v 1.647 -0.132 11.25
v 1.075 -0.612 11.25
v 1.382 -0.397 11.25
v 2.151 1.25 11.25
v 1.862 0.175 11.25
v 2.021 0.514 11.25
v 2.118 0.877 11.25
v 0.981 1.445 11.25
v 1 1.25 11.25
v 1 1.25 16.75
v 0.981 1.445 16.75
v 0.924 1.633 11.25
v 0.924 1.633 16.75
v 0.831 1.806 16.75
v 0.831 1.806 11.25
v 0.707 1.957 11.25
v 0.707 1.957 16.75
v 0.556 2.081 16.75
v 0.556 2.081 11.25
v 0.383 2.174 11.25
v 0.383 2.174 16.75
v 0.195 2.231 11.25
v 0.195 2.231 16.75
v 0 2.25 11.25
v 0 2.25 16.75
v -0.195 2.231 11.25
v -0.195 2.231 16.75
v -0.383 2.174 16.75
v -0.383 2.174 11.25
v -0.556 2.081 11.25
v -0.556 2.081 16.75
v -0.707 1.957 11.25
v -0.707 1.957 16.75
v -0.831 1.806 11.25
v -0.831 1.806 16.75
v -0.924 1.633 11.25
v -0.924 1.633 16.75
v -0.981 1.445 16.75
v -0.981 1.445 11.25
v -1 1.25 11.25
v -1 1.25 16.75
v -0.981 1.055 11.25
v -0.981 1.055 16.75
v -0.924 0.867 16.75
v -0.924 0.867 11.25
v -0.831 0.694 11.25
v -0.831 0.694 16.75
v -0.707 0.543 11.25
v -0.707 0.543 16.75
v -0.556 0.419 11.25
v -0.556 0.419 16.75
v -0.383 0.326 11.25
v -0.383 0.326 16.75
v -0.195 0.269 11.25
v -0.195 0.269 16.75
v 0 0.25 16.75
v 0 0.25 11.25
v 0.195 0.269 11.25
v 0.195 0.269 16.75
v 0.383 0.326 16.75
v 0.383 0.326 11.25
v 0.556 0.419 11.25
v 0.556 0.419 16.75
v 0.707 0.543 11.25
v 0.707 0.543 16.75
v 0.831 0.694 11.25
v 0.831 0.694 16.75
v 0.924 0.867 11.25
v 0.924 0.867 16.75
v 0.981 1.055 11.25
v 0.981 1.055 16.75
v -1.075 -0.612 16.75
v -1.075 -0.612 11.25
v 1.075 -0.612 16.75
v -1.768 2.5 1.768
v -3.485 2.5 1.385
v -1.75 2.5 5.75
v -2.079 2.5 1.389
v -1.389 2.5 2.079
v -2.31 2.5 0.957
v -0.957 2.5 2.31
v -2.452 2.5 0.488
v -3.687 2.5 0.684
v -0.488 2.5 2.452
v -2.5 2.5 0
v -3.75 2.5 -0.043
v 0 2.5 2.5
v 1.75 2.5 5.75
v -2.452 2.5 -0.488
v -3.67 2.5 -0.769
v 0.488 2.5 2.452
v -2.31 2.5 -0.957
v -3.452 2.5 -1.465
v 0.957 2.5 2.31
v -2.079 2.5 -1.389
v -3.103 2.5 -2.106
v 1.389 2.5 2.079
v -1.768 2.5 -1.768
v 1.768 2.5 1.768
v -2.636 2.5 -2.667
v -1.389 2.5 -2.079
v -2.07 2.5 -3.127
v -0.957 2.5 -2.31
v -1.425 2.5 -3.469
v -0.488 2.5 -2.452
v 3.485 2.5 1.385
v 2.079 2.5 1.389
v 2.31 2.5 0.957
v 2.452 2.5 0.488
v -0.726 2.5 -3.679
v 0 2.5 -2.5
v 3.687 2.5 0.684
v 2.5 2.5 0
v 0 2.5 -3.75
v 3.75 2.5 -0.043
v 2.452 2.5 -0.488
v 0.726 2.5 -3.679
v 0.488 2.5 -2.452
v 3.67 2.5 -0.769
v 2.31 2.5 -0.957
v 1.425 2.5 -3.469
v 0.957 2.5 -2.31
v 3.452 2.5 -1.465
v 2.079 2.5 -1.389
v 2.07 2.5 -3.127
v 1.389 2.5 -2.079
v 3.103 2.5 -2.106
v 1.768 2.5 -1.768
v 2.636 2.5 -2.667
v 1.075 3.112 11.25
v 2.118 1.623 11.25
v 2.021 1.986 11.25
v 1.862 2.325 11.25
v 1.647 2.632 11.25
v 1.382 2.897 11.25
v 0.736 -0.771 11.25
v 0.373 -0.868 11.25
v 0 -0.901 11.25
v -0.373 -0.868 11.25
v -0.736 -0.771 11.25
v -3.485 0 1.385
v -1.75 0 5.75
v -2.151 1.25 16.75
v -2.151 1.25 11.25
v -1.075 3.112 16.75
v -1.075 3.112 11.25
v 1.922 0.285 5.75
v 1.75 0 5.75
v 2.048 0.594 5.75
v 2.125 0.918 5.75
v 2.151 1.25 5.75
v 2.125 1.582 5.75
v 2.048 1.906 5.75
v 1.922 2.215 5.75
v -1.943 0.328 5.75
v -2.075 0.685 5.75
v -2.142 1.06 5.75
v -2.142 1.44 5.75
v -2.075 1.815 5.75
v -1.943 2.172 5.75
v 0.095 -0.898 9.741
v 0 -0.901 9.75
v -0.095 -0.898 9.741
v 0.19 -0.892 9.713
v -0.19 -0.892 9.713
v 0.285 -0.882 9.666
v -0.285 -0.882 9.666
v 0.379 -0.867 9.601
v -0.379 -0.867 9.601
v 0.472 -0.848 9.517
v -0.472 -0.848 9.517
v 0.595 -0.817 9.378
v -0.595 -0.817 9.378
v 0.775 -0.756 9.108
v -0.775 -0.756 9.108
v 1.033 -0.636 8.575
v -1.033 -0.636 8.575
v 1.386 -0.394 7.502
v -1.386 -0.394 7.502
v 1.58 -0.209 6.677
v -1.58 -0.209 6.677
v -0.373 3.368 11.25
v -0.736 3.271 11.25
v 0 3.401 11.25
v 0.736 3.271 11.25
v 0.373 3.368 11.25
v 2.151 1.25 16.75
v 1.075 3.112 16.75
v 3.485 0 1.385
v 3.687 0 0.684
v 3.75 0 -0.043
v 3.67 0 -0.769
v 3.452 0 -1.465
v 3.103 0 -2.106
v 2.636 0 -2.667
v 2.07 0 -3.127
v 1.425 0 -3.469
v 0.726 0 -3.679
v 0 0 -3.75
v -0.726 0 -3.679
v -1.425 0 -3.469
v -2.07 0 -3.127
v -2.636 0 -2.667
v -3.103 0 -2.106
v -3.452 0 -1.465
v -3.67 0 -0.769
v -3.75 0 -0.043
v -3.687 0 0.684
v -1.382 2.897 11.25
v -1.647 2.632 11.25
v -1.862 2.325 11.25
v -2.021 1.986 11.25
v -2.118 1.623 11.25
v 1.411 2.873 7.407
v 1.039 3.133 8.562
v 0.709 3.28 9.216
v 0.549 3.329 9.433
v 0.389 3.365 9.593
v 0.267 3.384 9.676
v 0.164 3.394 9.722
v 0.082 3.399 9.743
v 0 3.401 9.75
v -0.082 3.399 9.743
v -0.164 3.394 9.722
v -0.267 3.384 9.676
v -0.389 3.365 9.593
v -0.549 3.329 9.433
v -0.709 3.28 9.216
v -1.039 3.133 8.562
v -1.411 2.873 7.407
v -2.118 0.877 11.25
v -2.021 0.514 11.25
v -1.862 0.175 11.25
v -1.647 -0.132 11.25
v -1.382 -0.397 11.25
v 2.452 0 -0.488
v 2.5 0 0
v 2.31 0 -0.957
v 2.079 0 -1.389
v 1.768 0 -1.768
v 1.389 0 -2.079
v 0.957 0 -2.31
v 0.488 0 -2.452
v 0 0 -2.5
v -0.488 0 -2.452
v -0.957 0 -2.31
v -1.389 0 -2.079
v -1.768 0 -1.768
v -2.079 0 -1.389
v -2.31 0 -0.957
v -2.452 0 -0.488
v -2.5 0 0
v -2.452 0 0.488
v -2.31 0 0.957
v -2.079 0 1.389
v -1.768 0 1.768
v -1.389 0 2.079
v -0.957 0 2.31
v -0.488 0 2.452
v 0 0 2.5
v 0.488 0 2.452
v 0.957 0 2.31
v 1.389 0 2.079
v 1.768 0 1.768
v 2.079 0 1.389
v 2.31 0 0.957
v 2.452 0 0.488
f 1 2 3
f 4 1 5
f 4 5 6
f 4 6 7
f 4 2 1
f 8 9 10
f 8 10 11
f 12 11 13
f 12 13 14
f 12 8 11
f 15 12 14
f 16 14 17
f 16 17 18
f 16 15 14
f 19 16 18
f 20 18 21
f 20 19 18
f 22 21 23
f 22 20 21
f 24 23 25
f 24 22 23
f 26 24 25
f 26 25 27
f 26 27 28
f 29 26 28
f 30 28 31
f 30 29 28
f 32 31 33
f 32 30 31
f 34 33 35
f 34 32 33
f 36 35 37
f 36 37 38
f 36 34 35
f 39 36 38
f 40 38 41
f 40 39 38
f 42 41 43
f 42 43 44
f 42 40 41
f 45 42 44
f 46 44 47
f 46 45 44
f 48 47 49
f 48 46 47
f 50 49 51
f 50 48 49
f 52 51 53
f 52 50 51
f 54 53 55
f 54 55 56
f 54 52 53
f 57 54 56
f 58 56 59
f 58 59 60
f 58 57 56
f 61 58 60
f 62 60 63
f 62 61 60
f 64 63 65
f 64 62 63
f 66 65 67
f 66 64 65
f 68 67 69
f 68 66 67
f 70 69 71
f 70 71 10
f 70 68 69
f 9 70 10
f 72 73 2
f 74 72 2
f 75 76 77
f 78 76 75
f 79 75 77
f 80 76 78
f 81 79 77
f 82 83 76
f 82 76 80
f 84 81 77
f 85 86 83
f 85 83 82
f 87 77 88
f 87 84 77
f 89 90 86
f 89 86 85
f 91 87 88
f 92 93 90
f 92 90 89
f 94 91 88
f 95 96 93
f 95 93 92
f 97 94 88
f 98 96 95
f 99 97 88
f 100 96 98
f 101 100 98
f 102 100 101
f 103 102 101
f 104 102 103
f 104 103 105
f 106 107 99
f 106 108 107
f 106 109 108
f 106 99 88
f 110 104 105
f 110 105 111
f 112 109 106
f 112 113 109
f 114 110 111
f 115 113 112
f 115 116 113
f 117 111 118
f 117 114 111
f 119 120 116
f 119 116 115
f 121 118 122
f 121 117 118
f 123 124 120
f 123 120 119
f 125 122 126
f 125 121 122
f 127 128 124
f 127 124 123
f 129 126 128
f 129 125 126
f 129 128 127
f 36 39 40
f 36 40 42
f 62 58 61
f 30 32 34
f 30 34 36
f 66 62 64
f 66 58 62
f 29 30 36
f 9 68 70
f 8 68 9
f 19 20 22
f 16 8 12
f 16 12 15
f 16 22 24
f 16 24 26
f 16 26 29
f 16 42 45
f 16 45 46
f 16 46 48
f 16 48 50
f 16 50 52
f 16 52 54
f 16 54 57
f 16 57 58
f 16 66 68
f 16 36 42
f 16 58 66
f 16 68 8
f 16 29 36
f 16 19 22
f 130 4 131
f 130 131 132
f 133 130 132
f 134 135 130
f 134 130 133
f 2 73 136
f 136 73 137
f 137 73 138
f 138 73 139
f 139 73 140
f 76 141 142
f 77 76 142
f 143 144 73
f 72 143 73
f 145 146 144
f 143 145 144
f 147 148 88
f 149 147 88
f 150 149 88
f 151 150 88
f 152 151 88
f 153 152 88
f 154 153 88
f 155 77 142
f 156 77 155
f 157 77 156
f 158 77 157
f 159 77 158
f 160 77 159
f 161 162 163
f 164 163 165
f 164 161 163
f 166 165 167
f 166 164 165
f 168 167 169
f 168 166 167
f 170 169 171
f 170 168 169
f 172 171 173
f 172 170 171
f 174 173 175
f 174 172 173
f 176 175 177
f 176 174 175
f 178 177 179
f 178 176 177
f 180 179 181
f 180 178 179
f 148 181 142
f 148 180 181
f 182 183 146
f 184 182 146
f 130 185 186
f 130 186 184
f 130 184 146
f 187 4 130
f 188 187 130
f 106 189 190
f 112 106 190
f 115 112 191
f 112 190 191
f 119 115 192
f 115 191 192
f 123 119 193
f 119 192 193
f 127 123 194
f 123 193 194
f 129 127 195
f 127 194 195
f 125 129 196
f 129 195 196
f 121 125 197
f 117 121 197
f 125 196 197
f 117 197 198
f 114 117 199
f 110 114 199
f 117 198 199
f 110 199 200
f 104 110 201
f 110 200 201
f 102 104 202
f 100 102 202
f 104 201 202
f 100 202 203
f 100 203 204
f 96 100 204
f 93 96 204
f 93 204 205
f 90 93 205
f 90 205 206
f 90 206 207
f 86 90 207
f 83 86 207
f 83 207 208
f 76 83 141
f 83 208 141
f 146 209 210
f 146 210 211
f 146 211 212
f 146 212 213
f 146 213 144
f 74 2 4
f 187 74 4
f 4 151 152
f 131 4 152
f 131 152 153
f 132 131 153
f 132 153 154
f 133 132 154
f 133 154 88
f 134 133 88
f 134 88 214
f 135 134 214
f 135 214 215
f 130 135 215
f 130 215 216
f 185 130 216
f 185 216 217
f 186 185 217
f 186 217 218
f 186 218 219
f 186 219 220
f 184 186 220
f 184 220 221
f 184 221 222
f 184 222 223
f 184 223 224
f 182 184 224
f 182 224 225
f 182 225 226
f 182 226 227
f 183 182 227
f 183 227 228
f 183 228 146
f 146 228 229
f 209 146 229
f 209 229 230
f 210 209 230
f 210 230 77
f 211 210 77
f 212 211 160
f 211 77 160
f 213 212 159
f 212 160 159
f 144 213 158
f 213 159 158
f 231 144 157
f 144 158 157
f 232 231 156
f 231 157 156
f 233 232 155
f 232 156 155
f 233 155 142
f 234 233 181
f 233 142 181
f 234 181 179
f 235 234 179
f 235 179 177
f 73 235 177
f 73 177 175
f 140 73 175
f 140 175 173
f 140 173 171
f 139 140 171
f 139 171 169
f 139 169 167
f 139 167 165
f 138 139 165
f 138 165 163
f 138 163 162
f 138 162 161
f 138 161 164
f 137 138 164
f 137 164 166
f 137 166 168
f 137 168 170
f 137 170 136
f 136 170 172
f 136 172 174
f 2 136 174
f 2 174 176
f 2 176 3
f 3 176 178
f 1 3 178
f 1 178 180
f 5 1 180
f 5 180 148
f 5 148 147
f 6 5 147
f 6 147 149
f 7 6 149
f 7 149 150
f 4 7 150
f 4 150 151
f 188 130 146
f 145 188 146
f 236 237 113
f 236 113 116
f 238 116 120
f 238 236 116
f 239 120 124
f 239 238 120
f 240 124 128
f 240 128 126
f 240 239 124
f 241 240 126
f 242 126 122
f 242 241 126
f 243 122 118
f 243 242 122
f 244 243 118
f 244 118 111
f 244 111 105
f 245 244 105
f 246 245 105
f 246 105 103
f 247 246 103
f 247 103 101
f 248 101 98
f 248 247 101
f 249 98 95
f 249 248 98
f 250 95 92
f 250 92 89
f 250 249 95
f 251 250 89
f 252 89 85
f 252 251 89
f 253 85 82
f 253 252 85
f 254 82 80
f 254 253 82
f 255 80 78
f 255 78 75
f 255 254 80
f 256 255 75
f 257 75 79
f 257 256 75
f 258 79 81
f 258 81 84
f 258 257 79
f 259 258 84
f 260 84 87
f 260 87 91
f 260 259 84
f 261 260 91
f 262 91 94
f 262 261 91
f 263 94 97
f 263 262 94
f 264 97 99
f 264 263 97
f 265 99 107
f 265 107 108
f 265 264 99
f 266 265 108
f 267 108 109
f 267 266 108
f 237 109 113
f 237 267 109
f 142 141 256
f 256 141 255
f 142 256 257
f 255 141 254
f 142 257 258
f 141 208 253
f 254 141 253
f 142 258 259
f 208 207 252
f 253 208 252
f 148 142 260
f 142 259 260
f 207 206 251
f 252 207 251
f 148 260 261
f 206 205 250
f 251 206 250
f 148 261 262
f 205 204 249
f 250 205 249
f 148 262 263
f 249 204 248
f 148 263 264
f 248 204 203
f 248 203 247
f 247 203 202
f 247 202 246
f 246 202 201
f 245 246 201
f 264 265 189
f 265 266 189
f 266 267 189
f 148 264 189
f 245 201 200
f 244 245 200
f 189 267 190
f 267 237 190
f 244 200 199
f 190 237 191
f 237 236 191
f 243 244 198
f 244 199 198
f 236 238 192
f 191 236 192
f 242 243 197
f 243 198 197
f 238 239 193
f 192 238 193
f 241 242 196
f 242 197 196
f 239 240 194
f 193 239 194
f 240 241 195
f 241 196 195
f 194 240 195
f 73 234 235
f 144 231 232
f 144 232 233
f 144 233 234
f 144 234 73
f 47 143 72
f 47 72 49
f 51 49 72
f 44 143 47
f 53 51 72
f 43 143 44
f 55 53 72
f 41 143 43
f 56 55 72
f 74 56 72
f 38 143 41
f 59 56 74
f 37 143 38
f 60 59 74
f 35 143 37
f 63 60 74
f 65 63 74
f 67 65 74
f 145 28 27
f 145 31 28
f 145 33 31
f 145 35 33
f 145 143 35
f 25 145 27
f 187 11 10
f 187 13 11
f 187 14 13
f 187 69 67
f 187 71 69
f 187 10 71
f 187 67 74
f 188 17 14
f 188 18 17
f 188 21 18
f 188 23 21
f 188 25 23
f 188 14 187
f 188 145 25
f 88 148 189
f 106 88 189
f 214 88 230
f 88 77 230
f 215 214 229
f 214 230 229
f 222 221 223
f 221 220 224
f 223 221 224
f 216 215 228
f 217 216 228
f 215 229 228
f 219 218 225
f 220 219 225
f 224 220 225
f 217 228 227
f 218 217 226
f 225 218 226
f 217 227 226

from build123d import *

# Parameters (mm, degrees)
SKETCH1_R               = 2.5
BOSS_EXTRUDE1_DEPTH     = 2.5
SKETCH2_R               = 2.150581317
BOSS_EXTRUDE2_DEPTH     = 5.5
CUT_EXTRUDE1_DEPTH      = 5.5
CUT_EXTRUDE1_DEPTH_BACK = 5.5
SKETCH5_R               = 1
BOSS_EXTRUDE4_DEPTH     = 5.5


with BuildPart() as part:
    # Sketch1 → Boss-Extrude1 (new body)
    with BuildSketch(Plane(origin=(0, 0, 0), x_dir=(1, 0, 0), z_dir=(0, 1, 0))):
        with BuildLine():
            Line((1.75, -5.75), (3.484844943, -1.385047191))
            ThreePointArc((3.484844943, -1.385047191), (0, 3.75), (-3.484844943, -1.385047191))
            Line((-3.484844943, -1.385047191), (-1.75, -5.75))
            Line((-1.75, -5.75), (1.75, -5.75))
        make_face()
        Circle(SKETCH1_R, mode=Mode.SUBTRACT)
    extrude(amount=BOSS_EXTRUDE1_DEPTH)

    # Sketch2 → Boss-Extrude2 (add)
    with BuildSketch(Plane.XY.offset(5.75)):
        with Locations((0, 1.25)):
            Circle(SKETCH2_R)
    extrude(amount=BOSS_EXTRUDE2_DEPTH)

    # Sketch4 → Cut-Extrude1 (cut, two sides: drawn at the far end of the back side and taken through both)
    with BuildSketch(Plane(origin=(0, 0, 0), x_dir=(0, 0, -1), z_dir=(1, 0, 0)).offset(-CUT_EXTRUDE1_DEPTH_BACK)):
        Polygon((-5.75, 3.400581317), (-9.75, 3.400581317), (-5.75, 2.5), align=None)
        Polygon((-5.75, -0.900581317), (-5.75, 0), (-9.75, -0.900581317), align=None)
    extrude(amount=CUT_EXTRUDE1_DEPTH + CUT_EXTRUDE1_DEPTH_BACK, mode=Mode.SUBTRACT)

    # Sketch5 → Boss-Extrude4 (add)
    with BuildSketch(Plane.XY.offset(11.25)):
        Polygon((2.150581317, 1.25), (1.075290658, 3.112458053), (-1.075290658, 3.112458053), (-2.150581317, 1.25), (-1.075290658, -0.612458053), (1.075290658, -0.612458053), align=None)
        with Locations((0, 1.25)):
            Circle(SKETCH5_R, mode=Mode.SUBTRACT)
    extrude(amount=BOSS_EXTRUDE4_DEPTH)


solid = part.part
